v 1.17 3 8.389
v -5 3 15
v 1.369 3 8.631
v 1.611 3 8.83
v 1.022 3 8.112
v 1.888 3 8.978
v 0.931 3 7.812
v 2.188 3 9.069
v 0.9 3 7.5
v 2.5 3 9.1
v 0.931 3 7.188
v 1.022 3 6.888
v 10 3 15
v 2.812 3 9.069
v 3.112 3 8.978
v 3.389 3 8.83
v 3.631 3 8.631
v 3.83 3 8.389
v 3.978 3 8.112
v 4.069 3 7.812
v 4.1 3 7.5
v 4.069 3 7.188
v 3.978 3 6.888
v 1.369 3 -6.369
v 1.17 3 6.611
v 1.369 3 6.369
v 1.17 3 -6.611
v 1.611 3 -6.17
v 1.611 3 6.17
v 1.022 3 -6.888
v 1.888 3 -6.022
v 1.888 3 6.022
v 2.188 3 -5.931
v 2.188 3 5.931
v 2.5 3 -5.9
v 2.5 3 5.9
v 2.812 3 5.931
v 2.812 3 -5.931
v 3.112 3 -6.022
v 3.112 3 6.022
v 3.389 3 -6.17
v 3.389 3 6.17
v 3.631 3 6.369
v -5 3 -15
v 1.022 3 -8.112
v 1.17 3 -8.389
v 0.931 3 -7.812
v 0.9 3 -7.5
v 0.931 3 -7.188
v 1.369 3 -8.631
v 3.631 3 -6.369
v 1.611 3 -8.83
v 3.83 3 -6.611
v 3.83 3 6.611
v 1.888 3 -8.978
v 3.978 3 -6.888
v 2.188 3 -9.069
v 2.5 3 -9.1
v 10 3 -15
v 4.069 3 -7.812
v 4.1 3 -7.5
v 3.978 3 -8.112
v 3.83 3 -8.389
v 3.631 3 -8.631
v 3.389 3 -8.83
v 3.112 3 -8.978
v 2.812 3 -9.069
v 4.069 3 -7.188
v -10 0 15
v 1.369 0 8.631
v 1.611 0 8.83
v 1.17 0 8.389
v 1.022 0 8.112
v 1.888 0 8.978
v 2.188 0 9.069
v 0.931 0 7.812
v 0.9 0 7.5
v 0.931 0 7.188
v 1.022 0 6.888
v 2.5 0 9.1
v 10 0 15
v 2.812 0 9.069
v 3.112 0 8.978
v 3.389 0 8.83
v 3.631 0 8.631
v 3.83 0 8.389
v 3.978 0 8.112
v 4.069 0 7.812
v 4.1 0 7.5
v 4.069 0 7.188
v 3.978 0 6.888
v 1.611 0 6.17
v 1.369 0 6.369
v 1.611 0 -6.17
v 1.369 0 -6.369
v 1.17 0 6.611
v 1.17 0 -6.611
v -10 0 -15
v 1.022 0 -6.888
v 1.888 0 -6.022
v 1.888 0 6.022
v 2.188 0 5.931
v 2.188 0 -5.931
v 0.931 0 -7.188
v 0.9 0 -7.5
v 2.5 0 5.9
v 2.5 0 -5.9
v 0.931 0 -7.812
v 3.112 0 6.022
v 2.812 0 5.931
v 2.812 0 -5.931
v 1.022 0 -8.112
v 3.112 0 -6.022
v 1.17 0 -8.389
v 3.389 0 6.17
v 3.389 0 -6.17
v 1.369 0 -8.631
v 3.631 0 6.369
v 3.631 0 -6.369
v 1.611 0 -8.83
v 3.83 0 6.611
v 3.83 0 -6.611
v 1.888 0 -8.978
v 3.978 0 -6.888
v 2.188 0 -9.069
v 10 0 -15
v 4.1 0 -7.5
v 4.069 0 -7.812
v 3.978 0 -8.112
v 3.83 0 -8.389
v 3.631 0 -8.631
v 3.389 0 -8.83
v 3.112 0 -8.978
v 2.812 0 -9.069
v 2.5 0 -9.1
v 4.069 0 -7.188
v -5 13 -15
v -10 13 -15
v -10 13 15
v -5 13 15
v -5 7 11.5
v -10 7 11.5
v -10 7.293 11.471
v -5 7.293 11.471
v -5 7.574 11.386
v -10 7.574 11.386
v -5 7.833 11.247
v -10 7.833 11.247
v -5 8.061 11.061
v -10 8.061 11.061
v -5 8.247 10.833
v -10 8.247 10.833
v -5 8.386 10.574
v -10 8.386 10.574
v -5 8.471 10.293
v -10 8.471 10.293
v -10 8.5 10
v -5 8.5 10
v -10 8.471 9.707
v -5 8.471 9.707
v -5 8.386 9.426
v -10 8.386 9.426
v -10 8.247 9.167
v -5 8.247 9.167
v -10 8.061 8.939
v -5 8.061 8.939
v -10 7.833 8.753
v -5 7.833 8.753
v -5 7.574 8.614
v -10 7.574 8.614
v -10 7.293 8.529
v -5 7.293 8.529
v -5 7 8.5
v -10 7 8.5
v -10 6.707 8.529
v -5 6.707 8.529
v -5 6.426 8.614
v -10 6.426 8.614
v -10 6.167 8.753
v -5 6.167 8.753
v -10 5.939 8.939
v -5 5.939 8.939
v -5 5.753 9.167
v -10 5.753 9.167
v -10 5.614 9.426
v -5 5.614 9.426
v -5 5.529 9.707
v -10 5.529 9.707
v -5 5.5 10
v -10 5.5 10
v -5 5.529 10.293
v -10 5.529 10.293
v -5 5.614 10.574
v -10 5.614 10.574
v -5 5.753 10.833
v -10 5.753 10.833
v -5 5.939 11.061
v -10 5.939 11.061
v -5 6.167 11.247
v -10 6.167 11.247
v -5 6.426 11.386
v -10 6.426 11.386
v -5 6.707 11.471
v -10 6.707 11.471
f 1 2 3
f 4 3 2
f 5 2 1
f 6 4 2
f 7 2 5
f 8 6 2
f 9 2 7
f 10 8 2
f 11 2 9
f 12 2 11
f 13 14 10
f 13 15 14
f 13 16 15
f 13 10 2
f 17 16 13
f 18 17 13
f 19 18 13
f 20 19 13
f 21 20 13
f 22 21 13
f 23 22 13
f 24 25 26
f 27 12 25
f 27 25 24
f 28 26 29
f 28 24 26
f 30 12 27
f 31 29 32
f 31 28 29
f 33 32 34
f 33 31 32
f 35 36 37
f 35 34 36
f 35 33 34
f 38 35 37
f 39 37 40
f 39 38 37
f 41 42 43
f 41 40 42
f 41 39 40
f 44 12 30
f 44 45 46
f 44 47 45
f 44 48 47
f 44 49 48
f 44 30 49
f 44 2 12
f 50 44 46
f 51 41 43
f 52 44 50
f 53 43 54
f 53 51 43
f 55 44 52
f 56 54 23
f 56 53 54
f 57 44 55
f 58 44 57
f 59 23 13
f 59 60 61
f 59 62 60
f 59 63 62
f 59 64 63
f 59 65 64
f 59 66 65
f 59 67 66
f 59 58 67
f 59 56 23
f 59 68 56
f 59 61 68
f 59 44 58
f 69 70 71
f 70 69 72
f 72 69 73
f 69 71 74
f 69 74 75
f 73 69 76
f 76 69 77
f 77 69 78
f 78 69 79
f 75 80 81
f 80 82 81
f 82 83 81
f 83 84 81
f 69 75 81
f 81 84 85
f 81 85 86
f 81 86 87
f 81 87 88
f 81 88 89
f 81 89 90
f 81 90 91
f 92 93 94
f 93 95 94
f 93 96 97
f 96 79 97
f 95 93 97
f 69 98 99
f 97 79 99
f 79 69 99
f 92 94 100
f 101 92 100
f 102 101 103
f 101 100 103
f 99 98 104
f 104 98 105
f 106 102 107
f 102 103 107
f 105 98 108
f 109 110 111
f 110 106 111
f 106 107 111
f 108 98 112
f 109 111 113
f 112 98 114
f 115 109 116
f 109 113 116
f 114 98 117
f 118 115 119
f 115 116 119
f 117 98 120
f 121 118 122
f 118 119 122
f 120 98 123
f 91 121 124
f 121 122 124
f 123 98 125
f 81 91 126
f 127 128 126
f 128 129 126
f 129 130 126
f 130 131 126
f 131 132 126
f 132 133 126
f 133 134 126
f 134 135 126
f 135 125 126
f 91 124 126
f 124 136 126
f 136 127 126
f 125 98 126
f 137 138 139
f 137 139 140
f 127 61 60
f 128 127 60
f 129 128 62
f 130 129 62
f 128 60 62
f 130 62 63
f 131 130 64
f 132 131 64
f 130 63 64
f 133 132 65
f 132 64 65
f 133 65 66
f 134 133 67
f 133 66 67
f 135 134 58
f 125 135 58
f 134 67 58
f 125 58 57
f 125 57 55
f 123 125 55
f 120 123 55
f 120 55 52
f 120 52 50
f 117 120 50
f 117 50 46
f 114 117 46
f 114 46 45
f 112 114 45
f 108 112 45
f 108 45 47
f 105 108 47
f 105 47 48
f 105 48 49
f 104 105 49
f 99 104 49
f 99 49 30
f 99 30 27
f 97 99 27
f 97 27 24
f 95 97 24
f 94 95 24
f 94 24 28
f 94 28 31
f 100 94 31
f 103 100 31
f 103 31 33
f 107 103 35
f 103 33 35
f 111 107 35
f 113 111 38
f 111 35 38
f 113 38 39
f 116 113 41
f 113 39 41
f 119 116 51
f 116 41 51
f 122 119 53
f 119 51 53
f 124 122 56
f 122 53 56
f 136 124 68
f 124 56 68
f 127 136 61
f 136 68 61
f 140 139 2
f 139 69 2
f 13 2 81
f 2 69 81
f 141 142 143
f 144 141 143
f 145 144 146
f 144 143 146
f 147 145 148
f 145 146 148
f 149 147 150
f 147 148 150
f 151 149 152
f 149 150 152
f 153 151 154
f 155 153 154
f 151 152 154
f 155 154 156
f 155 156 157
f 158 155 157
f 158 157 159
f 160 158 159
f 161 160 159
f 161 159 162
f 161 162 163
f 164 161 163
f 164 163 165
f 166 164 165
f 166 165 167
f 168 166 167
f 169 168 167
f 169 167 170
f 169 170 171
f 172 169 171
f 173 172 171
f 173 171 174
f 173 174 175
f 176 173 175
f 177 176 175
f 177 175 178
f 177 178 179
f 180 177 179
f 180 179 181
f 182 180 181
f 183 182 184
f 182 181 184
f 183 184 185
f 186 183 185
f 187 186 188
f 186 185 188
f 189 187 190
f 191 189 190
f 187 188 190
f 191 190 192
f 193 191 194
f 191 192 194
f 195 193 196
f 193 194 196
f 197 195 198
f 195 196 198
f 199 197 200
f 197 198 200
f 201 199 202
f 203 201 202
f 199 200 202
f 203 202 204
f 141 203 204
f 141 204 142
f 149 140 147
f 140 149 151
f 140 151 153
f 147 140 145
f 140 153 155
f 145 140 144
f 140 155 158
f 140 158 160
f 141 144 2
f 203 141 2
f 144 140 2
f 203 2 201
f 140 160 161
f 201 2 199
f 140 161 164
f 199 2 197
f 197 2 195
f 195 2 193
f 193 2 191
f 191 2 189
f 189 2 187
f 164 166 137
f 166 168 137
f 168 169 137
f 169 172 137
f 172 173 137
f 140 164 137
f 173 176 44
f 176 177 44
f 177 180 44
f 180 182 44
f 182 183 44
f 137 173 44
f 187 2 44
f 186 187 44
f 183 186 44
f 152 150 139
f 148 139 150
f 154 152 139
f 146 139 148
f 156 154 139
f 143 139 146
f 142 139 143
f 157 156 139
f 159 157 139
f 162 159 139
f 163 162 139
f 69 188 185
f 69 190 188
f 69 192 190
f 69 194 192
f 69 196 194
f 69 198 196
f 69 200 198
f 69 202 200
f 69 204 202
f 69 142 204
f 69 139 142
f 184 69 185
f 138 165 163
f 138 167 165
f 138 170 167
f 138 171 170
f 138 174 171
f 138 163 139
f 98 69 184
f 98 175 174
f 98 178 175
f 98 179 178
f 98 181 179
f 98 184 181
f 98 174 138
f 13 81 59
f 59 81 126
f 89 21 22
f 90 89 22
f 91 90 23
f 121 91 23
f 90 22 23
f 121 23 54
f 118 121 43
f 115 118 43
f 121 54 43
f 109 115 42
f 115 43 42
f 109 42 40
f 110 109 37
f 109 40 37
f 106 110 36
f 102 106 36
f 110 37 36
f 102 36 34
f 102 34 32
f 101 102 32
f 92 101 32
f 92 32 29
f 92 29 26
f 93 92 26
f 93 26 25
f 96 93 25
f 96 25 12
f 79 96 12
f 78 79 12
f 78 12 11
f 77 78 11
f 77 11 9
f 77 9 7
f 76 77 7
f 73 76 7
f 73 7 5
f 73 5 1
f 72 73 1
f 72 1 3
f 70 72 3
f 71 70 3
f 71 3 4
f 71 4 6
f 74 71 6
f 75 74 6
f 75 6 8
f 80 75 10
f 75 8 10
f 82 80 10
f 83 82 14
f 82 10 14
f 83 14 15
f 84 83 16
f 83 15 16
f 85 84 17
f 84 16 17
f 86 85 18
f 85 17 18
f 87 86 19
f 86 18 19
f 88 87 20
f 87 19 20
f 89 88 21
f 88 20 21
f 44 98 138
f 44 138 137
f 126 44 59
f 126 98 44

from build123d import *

# Parameters (mm, degrees)
SKETCH1_W           = 20
SKETCH1_H           = 30
BOSS_EXTRUDE1_DEPTH = 3
SKETCH2_W           = 5
SKETCH2_H           = 30
BOSS_EXTRUDE2_DEPTH = 10
SKETCH3_R           = 1.5
CUT_EXTRUDE1_DEPTH  = 10
SKETCH4_R           = 1.6
CUT_EXTRUDE2_DEPTH  = 4


with BuildPart() as part:
    # Sketch1 → Boss-Extrude1 (new body)
    with BuildSketch(Plane(origin=(0, 0, 0), x_dir=(1, 0, 0), z_dir=(0, 1, 0))):
        Rectangle(SKETCH1_W, SKETCH1_H)
    extrude(amount=BOSS_EXTRUDE1_DEPTH)

    # Sketch2 → Boss-Extrude2 (add)
    with BuildSketch(Plane(origin=(0, 3, 0), x_dir=(1, 0, 0), z_dir=(0, 1, 0))):
        with Locations((-7.5, 0)):
            Rectangle(SKETCH2_W, SKETCH2_H)
    extrude(amount=BOSS_EXTRUDE2_DEPTH)

    # Sketch3 → Cut-Extrude1 (cut)
    with BuildSketch(Plane.ZY.offset(10)):
        with Locations((10, 7)):
            Circle(SKETCH3_R)
    extrude(amount=-CUT_EXTRUDE1_DEPTH, mode=Mode.SUBTRACT)

    # Sketch4 → Cut-Extrude2 (cut, through all)
    with BuildSketch(Plane(origin=(0, 3, 0), x_dir=(1, 0, 0), z_dir=(0, 1, 0))):
        with Locations((2.5, -7.5)):
            Circle(SKETCH4_R)
        with Locations((2.5, 7.5)):
            Circle(SKETCH4_R)
    extrude(amount=-CUT_EXTRUDE2_DEPTH, mode=Mode.SUBTRACT)


solid = part.part
